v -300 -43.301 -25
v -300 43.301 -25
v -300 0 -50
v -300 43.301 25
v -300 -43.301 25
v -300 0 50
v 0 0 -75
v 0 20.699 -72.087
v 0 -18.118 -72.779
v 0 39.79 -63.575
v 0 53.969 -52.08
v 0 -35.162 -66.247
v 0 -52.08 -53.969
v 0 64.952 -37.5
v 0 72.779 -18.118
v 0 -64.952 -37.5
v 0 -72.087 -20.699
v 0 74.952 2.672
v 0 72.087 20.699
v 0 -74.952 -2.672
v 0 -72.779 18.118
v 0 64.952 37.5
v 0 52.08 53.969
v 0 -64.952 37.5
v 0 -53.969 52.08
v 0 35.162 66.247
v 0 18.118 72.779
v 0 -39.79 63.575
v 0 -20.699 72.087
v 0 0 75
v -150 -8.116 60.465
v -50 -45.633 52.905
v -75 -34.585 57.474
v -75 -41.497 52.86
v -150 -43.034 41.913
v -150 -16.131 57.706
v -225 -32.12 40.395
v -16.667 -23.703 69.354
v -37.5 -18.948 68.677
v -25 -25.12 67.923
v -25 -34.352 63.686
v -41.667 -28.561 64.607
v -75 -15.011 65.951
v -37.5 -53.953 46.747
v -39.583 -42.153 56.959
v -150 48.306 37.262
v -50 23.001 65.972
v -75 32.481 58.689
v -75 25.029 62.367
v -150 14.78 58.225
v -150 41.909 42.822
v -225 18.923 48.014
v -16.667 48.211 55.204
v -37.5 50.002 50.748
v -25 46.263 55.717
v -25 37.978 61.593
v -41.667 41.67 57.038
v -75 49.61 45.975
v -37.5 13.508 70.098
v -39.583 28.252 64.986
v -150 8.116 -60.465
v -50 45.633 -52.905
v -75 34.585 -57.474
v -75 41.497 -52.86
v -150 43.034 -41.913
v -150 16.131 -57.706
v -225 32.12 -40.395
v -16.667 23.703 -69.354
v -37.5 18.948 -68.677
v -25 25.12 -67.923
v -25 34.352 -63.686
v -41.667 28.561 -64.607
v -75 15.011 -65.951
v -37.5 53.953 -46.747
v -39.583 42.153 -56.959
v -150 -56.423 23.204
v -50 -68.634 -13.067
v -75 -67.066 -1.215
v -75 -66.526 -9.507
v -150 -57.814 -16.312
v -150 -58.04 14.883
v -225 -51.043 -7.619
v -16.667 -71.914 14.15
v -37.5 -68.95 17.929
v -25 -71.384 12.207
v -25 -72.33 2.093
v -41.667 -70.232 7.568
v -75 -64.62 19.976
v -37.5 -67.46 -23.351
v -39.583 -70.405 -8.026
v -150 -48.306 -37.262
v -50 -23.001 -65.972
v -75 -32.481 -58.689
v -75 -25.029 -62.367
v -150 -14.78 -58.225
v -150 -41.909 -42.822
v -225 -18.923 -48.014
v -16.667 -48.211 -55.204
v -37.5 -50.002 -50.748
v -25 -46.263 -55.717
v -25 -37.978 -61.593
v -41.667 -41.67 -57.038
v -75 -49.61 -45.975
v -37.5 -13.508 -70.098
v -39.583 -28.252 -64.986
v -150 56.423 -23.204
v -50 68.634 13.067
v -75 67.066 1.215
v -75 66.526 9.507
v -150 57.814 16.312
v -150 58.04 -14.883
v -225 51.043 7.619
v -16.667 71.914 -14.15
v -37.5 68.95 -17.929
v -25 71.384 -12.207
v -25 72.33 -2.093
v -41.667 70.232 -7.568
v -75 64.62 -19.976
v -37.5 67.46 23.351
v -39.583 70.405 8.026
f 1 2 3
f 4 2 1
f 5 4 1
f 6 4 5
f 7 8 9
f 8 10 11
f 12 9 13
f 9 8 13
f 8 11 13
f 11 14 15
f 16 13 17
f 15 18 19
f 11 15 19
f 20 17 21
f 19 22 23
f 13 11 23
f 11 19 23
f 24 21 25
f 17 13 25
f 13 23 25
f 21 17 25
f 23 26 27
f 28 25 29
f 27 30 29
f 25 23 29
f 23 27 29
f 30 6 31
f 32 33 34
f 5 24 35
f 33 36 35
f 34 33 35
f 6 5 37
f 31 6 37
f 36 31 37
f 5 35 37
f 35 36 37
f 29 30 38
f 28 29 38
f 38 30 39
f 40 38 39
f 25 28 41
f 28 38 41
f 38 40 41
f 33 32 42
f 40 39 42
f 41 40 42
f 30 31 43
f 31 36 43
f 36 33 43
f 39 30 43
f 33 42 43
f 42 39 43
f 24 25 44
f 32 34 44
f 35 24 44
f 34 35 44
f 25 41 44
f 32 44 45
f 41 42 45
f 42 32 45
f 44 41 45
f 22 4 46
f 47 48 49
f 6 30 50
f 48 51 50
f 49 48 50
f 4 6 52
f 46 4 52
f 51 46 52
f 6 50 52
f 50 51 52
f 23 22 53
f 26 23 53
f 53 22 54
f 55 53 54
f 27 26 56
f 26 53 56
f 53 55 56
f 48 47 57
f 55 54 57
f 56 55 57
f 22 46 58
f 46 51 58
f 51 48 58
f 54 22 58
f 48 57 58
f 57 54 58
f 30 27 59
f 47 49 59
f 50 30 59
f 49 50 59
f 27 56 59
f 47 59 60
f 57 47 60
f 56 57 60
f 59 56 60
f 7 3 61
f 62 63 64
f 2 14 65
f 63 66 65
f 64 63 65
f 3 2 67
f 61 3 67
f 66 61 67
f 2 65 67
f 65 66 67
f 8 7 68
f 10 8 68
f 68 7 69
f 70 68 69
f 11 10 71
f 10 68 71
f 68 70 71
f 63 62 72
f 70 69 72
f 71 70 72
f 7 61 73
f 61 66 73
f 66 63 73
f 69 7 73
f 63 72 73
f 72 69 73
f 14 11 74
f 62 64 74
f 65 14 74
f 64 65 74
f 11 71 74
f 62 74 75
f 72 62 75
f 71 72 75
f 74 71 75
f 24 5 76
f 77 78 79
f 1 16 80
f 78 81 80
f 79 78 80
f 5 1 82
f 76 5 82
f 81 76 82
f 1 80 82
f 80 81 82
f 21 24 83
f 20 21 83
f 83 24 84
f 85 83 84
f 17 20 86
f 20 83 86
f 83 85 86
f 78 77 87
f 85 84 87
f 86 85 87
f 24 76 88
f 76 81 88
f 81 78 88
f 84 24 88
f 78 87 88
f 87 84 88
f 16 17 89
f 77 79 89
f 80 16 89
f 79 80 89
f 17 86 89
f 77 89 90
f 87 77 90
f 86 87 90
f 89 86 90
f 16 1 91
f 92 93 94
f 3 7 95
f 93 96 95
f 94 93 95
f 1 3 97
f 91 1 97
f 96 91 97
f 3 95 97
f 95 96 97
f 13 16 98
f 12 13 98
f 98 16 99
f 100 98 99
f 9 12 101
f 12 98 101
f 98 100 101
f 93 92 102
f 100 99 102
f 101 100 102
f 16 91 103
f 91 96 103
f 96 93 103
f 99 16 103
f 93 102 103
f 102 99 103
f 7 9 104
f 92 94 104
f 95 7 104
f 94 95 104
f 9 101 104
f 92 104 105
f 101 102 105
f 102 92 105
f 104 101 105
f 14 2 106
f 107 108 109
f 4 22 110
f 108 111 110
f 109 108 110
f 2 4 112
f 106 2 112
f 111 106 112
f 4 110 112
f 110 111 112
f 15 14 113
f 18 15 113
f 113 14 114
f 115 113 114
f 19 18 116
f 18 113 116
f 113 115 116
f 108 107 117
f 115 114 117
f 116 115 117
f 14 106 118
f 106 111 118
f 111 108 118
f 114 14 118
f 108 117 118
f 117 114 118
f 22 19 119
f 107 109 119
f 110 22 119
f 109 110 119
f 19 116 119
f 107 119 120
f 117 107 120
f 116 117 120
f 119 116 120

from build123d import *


# Not quite as in the source:
# - the arcs of a loft's sections are written as splines that run evenly, so that the points pair up as in the source's solid


with BuildPart() as f3:
    # F0 (on Right) → F3 section 0
    with BuildSketch(Plane.YZ):
        with BuildLine():
            add(Edge.make_bspline(
                [(64.9519052838, 37.5), (62.7702437188, 41.2787486755), (60.2580232789, 44.8665712892), (54.6486431889, 51.5515701637), (51.5515701637, 54.6486431889), (44.8665712892, 60.2580232789), (41.2787486755, 62.7702437188), (33.7212513245, 67.1335668488), (29.7516932968, 68.9846021566), (21.5513282021, 71.9692909612), (17.3206477723, 73.1028983658), (8.7265788777, 74.618264586), (4.36332313, 75), (0, 75)],
                knots=[0, 0, 0, 0, 0.1666666667, 0.1666666667, 0.3333333333, 0.3333333333, 0.5, 0.5, 0.6666666667, 0.6666666667, 0.8333333333, 0.8333333333, 1, 1, 1, 1], degree=3))
            add(Edge.make_bspline(
                [(0, 75), (-4.36332313, 75), (-8.7265788777, 74.618264586), (-17.3206477723, 73.1028983658), (-21.5513282021, 71.9692909612), (-29.7516932968, 68.9846021566), (-33.7212513245, 67.1335668488), (-41.2787486755, 62.7702437188), (-44.8665712892, 60.2580232789), (-51.5515701637, 54.6486431889), (-54.6486431889, 51.5515701637), (-60.2580232789, 44.8665712892), (-62.7702437188, 41.2787486755), (-64.9519052838, 37.5)],
                knots=[0, 0, 0, 0, 0.1666666667, 0.1666666667, 0.3333333333, 0.3333333333, 0.5, 0.5, 0.6666666667, 0.6666666667, 0.8333333333, 0.8333333333, 1, 1, 1, 1], degree=3))
            add(Edge.make_bspline(
                [(-64.9519052838, 37.5), (-67.1335668488, 33.7212513245), (-68.9846021566, 29.7516932968), (-71.9692909612, 21.5513282021), (-73.1028983658, 17.3206477723), (-74.618264586, 8.7265788777), (-75, 4.36332313), (-75, -4.36332313), (-74.618264586, -8.7265788777), (-73.1028983658, -17.3206477723), (-71.9692909612, -21.5513282021), (-68.9846021566, -29.7516932968), (-67.1335668488, -33.7212513245), (-64.9519052838, -37.5)],
                knots=[0, 0, 0, 0, 0.1666666667, 0.1666666667, 0.3333333333, 0.3333333333, 0.5, 0.5, 0.6666666667, 0.6666666667, 0.8333333333, 0.8333333333, 1, 1, 1, 1], degree=3))
            add(Edge.make_bspline(
                [(-64.9519052838, -37.5), (-62.7702437188, -41.2787486755), (-60.2580232789, -44.8665712892), (-54.6486431889, -51.5515701637), (-51.5515701637, -54.6486431889), (-44.8665712892, -60.2580232789), (-41.2787486755, -62.7702437188), (-33.7212513245, -67.1335668488), (-29.7516932968, -68.9846021566), (-21.5513282021, -71.9692909612), (-17.3206477723, -73.1028983658), (-8.7265788777, -74.618264586), (-4.36332313, -75), (0, -75)],
                knots=[0, 0, 0, 0, 0.1666666667, 0.1666666667, 0.3333333333, 0.3333333333, 0.5, 0.5, 0.6666666667, 0.6666666667, 0.8333333333, 0.8333333333, 1, 1, 1, 1], degree=3))
            add(Edge.make_bspline(
                [(0, -75), (4.36332313, -75), (8.7265788777, -74.618264586), (17.3206477723, -73.1028983658), (21.5513282021, -71.9692909612), (29.7516932968, -68.9846021566), (33.7212513245, -67.1335668488), (41.2787486755, -62.7702437188), (44.8665712892, -60.2580232789), (51.5515701637, -54.6486431889), (54.6486431889, -51.5515701637), (60.2580232789, -44.8665712892), (62.7702437188, -41.2787486755), (64.9519052838, -37.5)],
                knots=[0, 0, 0, 0, 0.1666666667, 0.1666666667, 0.3333333333, 0.3333333333, 0.5, 0.5, 0.6666666667, 0.6666666667, 0.8333333333, 0.8333333333, 1, 1, 1, 1], degree=3))
            add(Edge.make_bspline(
                [(64.9519052838, -37.5), (67.1335668488, -33.7212513245), (68.9846021566, -29.7516932968), (71.9692909612, -21.5513282021), (73.1028983658, -17.3206477723), (74.618264586, -8.7265788777), (75, -4.36332313), (75, 4.36332313), (74.618264586, 8.7265788777), (73.1028983658, 17.3206477723), (71.9692909612, 21.5513282021), (68.9846021566, 29.7516932968), (67.1335668488, 33.7212513245), (64.9519052838, 37.5)],
                knots=[0, 0, 0, 0, 0.1666666667, 0.1666666667, 0.3333333333, 0.3333333333, 0.5, 0.5, 0.6666666667, 0.6666666667, 0.8333333333, 0.8333333333, 1, 1, 1, 1], degree=3))
        make_face()
    # F2 (on offset) → F3 section 1
    with BuildSketch(Plane.YZ.offset(-300)):
        Polygon((43.3012701892, 25), (0, 50), (-43.3012701892, 25), (-43.3012701892, -25), (0, -50), (43.3012701892, -25), align=None)
    loft(ruled=True)


solid = f3.part
